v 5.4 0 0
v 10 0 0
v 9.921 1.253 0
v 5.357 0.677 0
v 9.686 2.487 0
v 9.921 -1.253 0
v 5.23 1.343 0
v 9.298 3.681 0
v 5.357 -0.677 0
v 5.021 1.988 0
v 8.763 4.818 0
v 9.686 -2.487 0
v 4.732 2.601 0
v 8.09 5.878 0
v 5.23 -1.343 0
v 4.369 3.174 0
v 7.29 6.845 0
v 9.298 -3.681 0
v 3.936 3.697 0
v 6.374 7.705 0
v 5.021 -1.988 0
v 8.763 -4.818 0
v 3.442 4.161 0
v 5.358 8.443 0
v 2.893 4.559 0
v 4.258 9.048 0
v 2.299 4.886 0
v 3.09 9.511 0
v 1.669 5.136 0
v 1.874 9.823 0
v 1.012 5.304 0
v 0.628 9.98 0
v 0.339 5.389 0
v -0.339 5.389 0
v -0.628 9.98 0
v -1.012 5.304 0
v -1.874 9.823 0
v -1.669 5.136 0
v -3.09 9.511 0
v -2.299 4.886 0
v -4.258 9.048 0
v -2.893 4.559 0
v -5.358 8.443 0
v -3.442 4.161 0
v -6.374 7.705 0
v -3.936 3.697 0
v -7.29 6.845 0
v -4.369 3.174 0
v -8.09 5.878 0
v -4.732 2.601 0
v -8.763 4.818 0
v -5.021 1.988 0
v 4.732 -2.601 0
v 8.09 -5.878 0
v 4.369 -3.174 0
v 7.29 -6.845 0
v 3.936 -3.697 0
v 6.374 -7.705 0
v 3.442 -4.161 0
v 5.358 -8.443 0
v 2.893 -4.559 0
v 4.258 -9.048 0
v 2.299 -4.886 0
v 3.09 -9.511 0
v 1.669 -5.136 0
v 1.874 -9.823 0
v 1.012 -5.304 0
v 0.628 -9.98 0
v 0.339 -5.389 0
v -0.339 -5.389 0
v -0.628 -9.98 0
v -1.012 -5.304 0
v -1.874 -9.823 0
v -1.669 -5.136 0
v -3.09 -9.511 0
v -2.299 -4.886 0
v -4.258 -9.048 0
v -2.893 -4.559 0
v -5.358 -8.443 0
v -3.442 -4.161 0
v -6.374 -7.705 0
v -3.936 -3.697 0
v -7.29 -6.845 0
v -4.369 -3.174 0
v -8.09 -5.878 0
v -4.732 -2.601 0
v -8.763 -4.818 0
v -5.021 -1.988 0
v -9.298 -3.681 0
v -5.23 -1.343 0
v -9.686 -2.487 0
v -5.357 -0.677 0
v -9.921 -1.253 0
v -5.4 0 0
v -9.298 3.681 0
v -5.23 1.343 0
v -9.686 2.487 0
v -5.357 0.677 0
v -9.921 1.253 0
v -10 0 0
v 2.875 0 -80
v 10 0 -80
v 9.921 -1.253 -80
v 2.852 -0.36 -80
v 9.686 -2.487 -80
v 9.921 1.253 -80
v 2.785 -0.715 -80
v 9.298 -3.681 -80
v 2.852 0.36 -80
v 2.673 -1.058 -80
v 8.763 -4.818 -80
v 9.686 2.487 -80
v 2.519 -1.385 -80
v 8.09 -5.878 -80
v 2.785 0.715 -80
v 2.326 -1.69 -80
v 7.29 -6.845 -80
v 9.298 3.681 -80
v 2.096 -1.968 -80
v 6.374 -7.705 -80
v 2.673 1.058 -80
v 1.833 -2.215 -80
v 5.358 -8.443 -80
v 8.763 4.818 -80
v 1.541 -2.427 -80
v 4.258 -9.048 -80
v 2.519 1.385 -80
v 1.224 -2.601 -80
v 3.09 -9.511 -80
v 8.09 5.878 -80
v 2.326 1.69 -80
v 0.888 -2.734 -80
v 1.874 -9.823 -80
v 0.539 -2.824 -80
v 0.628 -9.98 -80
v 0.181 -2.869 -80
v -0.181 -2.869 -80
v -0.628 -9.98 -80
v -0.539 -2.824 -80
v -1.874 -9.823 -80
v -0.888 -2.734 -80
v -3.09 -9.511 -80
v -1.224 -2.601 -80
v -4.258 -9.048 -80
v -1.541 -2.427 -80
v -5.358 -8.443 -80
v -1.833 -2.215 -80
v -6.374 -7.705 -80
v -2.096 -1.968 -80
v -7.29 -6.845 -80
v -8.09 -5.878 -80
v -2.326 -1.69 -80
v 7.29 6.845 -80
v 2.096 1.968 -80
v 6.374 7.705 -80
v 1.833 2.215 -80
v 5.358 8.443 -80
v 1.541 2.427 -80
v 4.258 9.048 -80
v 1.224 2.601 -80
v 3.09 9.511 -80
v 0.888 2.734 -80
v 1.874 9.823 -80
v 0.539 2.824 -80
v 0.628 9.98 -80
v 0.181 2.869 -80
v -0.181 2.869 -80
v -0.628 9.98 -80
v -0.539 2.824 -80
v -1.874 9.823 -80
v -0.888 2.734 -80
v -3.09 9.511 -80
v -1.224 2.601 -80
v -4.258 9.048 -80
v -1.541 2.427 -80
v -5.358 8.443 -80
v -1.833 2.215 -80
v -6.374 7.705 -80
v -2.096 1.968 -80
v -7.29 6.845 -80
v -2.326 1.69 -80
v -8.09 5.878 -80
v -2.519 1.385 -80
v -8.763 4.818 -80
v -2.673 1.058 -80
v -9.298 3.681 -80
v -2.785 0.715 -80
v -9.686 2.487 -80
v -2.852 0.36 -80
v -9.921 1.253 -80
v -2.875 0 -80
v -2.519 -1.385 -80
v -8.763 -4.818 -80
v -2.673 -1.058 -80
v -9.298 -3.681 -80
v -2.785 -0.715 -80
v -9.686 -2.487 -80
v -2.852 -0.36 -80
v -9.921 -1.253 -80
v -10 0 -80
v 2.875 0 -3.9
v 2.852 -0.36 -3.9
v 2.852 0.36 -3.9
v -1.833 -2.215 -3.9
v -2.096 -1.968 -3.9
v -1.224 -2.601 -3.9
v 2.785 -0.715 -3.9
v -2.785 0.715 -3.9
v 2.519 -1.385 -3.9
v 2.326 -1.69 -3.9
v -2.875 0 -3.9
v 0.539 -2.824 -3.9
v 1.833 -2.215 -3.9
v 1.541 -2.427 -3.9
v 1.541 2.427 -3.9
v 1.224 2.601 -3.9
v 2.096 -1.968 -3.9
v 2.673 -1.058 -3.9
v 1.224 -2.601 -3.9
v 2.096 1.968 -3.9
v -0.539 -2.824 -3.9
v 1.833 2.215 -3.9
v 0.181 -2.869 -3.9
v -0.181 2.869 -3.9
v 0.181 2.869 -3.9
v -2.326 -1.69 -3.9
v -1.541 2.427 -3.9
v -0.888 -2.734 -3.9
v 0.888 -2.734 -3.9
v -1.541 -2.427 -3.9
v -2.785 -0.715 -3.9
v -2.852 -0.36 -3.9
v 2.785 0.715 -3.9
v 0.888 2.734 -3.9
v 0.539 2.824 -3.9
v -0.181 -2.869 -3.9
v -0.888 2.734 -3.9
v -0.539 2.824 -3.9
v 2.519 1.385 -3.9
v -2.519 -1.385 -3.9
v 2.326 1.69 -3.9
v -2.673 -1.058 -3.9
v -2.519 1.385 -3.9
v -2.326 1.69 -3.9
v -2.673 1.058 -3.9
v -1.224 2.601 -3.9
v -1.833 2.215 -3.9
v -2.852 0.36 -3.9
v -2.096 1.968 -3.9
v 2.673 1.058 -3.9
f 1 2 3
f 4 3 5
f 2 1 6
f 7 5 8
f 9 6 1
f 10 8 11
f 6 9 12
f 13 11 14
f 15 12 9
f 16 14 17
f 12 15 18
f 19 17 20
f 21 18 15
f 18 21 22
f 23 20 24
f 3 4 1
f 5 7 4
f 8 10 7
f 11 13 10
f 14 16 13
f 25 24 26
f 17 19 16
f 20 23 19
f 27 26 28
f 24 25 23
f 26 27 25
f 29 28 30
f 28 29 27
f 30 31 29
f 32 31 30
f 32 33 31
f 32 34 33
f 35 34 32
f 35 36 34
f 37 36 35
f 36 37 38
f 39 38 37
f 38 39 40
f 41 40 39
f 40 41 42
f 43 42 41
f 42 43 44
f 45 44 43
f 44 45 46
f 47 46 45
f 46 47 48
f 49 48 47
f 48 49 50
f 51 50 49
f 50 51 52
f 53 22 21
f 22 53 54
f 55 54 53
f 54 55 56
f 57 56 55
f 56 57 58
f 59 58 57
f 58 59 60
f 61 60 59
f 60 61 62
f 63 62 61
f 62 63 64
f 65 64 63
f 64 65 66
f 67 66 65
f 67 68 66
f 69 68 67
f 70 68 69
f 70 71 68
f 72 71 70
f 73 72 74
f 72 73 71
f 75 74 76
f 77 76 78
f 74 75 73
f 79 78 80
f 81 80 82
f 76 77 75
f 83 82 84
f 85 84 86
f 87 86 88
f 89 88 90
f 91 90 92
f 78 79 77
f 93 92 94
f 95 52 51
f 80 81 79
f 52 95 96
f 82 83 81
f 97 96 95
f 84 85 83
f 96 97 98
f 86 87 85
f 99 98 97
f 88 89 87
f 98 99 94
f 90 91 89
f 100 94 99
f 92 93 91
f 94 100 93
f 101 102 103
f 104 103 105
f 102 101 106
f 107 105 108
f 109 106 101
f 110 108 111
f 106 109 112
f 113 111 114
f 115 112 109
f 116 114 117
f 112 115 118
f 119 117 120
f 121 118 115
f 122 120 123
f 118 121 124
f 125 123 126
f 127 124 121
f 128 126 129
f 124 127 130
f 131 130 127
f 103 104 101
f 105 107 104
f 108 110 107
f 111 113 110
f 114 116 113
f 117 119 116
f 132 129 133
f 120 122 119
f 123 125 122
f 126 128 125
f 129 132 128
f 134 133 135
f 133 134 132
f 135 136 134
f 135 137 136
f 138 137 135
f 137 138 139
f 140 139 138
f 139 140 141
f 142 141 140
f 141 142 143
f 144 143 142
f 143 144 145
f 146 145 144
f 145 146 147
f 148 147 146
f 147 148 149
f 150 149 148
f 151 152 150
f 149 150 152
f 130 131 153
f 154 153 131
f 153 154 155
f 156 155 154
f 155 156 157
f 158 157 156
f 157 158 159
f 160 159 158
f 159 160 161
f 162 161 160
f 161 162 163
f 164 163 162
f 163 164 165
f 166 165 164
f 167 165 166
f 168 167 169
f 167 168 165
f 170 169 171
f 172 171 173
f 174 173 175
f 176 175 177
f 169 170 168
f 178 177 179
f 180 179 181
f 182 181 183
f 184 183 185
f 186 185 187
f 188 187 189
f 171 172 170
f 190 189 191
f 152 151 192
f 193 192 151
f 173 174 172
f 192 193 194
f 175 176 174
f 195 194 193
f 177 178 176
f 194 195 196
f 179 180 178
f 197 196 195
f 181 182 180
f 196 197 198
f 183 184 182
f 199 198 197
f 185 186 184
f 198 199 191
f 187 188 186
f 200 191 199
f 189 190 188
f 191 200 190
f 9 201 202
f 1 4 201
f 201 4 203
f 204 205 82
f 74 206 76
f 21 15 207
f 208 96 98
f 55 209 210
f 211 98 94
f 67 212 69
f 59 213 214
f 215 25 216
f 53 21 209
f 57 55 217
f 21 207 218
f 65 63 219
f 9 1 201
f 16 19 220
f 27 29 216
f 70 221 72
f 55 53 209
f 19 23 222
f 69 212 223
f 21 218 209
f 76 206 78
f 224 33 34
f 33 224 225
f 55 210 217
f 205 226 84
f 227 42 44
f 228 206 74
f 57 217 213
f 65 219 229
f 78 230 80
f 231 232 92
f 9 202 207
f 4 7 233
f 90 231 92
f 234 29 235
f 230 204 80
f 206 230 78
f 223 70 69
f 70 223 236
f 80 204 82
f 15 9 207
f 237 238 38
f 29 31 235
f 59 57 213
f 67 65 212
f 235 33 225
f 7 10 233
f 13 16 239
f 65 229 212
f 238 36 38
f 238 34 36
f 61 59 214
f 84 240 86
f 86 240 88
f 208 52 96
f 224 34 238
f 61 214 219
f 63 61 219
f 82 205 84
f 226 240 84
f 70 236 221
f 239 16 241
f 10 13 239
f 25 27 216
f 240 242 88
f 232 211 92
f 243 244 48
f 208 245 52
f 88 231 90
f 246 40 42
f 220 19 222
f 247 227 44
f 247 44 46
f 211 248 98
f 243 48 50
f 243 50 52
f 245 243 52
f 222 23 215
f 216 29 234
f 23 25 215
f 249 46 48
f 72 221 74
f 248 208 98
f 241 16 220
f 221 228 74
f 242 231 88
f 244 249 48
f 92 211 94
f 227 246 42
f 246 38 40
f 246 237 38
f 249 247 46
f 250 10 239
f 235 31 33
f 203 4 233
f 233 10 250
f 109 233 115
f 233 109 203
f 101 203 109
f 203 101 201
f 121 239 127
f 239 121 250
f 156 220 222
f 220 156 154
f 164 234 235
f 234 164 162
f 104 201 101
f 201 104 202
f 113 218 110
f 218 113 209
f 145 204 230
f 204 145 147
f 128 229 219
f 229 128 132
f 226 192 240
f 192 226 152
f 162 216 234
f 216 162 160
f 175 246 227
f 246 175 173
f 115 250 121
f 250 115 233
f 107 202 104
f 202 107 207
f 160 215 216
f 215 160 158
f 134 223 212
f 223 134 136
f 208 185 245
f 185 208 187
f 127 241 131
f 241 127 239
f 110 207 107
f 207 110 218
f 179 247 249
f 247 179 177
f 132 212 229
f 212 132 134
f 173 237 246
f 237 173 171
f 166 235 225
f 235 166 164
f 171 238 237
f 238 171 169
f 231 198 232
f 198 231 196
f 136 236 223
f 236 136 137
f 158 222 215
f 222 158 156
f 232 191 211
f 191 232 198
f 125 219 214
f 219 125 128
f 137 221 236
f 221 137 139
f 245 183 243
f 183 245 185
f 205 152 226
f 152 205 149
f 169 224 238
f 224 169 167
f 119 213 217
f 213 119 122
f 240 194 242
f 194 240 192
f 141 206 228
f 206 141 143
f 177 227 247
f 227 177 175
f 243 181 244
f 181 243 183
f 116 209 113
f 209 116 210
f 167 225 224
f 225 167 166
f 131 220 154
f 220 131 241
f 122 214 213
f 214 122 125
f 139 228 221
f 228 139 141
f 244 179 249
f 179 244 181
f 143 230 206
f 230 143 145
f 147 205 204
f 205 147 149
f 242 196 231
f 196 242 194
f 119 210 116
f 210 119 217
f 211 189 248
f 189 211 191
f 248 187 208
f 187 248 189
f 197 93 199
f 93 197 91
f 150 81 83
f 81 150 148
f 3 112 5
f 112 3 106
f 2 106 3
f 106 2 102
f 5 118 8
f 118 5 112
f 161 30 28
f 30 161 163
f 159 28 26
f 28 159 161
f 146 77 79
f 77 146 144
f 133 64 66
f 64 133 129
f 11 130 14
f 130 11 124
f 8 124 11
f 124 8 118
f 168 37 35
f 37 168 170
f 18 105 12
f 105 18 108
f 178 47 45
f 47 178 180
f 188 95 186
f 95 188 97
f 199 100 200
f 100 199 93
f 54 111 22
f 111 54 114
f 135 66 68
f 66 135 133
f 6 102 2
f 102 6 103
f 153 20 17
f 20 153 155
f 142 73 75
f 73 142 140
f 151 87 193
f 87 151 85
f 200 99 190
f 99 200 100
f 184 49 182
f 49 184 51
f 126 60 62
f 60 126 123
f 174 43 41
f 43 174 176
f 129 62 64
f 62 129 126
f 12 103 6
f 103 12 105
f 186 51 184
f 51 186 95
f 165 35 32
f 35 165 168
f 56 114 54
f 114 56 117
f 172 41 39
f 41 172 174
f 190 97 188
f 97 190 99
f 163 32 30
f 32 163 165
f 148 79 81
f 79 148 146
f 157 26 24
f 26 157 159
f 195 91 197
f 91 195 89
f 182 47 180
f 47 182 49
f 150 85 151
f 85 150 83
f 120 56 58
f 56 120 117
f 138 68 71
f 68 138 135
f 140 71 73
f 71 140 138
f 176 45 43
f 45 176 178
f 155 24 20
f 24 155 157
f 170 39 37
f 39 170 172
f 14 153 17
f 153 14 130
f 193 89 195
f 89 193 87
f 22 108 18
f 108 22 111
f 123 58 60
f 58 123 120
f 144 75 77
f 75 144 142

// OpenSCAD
$fn = 50;


difference() {
	union() {
		translate(v = [0, 0, -80.0000000000]) {
			cylinder(h = 80, r = 10.0000000000);
		}
		cylinder(h = 0, r = 19.0000000000);
	}
	union() {
		translate(v = [0, 0, 0]) {
			rotate(a = [0, 0, 0]) {
				difference() {
					union() {
						#translate(v = [0, 0, -80.0000000000]) {
							cylinder(h = 80, r = 2.6000000000);
						}
						#translate(v = [0, 0, -3.9000000000]) {
							cylinder(h = 3.9000000000, r = 10.0000000000, r1 = 2.8750000000, r2 = 5.4000000000);
						}
						#translate(v = [0, 0, -80.0000000000]) {
							cylinder(h = 80, r = 2.8750000000);
						}
						#translate(v = [0, 0, -80.0000000000]) {
							cylinder(h = 80, r = 2.6000000000);
						}
					}
					union();
				}
			}
		}
	}
}
